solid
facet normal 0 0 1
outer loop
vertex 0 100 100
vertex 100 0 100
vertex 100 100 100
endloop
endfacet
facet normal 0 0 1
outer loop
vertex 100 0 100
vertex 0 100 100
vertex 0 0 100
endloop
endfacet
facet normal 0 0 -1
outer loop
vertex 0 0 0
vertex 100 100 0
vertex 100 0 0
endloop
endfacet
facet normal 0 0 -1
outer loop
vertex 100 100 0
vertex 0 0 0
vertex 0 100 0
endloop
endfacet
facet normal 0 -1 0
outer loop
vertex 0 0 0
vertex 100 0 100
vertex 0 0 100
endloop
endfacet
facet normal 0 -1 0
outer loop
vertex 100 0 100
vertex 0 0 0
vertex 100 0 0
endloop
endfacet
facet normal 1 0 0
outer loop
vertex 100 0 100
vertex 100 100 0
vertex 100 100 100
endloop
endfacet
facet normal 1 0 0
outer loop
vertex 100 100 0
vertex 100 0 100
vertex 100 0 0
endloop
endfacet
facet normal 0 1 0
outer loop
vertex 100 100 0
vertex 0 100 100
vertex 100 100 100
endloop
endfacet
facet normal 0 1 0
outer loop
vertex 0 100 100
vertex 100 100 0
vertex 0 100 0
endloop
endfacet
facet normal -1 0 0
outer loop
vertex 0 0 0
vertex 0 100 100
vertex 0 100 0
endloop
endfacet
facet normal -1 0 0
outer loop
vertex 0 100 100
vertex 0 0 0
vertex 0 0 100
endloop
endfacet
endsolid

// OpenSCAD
// Generate a Cube with 100mm edges. For testing infill stuff and dimentional calibration stuff.
edge = 100;
cube([edge, edge, edge],center=false);
